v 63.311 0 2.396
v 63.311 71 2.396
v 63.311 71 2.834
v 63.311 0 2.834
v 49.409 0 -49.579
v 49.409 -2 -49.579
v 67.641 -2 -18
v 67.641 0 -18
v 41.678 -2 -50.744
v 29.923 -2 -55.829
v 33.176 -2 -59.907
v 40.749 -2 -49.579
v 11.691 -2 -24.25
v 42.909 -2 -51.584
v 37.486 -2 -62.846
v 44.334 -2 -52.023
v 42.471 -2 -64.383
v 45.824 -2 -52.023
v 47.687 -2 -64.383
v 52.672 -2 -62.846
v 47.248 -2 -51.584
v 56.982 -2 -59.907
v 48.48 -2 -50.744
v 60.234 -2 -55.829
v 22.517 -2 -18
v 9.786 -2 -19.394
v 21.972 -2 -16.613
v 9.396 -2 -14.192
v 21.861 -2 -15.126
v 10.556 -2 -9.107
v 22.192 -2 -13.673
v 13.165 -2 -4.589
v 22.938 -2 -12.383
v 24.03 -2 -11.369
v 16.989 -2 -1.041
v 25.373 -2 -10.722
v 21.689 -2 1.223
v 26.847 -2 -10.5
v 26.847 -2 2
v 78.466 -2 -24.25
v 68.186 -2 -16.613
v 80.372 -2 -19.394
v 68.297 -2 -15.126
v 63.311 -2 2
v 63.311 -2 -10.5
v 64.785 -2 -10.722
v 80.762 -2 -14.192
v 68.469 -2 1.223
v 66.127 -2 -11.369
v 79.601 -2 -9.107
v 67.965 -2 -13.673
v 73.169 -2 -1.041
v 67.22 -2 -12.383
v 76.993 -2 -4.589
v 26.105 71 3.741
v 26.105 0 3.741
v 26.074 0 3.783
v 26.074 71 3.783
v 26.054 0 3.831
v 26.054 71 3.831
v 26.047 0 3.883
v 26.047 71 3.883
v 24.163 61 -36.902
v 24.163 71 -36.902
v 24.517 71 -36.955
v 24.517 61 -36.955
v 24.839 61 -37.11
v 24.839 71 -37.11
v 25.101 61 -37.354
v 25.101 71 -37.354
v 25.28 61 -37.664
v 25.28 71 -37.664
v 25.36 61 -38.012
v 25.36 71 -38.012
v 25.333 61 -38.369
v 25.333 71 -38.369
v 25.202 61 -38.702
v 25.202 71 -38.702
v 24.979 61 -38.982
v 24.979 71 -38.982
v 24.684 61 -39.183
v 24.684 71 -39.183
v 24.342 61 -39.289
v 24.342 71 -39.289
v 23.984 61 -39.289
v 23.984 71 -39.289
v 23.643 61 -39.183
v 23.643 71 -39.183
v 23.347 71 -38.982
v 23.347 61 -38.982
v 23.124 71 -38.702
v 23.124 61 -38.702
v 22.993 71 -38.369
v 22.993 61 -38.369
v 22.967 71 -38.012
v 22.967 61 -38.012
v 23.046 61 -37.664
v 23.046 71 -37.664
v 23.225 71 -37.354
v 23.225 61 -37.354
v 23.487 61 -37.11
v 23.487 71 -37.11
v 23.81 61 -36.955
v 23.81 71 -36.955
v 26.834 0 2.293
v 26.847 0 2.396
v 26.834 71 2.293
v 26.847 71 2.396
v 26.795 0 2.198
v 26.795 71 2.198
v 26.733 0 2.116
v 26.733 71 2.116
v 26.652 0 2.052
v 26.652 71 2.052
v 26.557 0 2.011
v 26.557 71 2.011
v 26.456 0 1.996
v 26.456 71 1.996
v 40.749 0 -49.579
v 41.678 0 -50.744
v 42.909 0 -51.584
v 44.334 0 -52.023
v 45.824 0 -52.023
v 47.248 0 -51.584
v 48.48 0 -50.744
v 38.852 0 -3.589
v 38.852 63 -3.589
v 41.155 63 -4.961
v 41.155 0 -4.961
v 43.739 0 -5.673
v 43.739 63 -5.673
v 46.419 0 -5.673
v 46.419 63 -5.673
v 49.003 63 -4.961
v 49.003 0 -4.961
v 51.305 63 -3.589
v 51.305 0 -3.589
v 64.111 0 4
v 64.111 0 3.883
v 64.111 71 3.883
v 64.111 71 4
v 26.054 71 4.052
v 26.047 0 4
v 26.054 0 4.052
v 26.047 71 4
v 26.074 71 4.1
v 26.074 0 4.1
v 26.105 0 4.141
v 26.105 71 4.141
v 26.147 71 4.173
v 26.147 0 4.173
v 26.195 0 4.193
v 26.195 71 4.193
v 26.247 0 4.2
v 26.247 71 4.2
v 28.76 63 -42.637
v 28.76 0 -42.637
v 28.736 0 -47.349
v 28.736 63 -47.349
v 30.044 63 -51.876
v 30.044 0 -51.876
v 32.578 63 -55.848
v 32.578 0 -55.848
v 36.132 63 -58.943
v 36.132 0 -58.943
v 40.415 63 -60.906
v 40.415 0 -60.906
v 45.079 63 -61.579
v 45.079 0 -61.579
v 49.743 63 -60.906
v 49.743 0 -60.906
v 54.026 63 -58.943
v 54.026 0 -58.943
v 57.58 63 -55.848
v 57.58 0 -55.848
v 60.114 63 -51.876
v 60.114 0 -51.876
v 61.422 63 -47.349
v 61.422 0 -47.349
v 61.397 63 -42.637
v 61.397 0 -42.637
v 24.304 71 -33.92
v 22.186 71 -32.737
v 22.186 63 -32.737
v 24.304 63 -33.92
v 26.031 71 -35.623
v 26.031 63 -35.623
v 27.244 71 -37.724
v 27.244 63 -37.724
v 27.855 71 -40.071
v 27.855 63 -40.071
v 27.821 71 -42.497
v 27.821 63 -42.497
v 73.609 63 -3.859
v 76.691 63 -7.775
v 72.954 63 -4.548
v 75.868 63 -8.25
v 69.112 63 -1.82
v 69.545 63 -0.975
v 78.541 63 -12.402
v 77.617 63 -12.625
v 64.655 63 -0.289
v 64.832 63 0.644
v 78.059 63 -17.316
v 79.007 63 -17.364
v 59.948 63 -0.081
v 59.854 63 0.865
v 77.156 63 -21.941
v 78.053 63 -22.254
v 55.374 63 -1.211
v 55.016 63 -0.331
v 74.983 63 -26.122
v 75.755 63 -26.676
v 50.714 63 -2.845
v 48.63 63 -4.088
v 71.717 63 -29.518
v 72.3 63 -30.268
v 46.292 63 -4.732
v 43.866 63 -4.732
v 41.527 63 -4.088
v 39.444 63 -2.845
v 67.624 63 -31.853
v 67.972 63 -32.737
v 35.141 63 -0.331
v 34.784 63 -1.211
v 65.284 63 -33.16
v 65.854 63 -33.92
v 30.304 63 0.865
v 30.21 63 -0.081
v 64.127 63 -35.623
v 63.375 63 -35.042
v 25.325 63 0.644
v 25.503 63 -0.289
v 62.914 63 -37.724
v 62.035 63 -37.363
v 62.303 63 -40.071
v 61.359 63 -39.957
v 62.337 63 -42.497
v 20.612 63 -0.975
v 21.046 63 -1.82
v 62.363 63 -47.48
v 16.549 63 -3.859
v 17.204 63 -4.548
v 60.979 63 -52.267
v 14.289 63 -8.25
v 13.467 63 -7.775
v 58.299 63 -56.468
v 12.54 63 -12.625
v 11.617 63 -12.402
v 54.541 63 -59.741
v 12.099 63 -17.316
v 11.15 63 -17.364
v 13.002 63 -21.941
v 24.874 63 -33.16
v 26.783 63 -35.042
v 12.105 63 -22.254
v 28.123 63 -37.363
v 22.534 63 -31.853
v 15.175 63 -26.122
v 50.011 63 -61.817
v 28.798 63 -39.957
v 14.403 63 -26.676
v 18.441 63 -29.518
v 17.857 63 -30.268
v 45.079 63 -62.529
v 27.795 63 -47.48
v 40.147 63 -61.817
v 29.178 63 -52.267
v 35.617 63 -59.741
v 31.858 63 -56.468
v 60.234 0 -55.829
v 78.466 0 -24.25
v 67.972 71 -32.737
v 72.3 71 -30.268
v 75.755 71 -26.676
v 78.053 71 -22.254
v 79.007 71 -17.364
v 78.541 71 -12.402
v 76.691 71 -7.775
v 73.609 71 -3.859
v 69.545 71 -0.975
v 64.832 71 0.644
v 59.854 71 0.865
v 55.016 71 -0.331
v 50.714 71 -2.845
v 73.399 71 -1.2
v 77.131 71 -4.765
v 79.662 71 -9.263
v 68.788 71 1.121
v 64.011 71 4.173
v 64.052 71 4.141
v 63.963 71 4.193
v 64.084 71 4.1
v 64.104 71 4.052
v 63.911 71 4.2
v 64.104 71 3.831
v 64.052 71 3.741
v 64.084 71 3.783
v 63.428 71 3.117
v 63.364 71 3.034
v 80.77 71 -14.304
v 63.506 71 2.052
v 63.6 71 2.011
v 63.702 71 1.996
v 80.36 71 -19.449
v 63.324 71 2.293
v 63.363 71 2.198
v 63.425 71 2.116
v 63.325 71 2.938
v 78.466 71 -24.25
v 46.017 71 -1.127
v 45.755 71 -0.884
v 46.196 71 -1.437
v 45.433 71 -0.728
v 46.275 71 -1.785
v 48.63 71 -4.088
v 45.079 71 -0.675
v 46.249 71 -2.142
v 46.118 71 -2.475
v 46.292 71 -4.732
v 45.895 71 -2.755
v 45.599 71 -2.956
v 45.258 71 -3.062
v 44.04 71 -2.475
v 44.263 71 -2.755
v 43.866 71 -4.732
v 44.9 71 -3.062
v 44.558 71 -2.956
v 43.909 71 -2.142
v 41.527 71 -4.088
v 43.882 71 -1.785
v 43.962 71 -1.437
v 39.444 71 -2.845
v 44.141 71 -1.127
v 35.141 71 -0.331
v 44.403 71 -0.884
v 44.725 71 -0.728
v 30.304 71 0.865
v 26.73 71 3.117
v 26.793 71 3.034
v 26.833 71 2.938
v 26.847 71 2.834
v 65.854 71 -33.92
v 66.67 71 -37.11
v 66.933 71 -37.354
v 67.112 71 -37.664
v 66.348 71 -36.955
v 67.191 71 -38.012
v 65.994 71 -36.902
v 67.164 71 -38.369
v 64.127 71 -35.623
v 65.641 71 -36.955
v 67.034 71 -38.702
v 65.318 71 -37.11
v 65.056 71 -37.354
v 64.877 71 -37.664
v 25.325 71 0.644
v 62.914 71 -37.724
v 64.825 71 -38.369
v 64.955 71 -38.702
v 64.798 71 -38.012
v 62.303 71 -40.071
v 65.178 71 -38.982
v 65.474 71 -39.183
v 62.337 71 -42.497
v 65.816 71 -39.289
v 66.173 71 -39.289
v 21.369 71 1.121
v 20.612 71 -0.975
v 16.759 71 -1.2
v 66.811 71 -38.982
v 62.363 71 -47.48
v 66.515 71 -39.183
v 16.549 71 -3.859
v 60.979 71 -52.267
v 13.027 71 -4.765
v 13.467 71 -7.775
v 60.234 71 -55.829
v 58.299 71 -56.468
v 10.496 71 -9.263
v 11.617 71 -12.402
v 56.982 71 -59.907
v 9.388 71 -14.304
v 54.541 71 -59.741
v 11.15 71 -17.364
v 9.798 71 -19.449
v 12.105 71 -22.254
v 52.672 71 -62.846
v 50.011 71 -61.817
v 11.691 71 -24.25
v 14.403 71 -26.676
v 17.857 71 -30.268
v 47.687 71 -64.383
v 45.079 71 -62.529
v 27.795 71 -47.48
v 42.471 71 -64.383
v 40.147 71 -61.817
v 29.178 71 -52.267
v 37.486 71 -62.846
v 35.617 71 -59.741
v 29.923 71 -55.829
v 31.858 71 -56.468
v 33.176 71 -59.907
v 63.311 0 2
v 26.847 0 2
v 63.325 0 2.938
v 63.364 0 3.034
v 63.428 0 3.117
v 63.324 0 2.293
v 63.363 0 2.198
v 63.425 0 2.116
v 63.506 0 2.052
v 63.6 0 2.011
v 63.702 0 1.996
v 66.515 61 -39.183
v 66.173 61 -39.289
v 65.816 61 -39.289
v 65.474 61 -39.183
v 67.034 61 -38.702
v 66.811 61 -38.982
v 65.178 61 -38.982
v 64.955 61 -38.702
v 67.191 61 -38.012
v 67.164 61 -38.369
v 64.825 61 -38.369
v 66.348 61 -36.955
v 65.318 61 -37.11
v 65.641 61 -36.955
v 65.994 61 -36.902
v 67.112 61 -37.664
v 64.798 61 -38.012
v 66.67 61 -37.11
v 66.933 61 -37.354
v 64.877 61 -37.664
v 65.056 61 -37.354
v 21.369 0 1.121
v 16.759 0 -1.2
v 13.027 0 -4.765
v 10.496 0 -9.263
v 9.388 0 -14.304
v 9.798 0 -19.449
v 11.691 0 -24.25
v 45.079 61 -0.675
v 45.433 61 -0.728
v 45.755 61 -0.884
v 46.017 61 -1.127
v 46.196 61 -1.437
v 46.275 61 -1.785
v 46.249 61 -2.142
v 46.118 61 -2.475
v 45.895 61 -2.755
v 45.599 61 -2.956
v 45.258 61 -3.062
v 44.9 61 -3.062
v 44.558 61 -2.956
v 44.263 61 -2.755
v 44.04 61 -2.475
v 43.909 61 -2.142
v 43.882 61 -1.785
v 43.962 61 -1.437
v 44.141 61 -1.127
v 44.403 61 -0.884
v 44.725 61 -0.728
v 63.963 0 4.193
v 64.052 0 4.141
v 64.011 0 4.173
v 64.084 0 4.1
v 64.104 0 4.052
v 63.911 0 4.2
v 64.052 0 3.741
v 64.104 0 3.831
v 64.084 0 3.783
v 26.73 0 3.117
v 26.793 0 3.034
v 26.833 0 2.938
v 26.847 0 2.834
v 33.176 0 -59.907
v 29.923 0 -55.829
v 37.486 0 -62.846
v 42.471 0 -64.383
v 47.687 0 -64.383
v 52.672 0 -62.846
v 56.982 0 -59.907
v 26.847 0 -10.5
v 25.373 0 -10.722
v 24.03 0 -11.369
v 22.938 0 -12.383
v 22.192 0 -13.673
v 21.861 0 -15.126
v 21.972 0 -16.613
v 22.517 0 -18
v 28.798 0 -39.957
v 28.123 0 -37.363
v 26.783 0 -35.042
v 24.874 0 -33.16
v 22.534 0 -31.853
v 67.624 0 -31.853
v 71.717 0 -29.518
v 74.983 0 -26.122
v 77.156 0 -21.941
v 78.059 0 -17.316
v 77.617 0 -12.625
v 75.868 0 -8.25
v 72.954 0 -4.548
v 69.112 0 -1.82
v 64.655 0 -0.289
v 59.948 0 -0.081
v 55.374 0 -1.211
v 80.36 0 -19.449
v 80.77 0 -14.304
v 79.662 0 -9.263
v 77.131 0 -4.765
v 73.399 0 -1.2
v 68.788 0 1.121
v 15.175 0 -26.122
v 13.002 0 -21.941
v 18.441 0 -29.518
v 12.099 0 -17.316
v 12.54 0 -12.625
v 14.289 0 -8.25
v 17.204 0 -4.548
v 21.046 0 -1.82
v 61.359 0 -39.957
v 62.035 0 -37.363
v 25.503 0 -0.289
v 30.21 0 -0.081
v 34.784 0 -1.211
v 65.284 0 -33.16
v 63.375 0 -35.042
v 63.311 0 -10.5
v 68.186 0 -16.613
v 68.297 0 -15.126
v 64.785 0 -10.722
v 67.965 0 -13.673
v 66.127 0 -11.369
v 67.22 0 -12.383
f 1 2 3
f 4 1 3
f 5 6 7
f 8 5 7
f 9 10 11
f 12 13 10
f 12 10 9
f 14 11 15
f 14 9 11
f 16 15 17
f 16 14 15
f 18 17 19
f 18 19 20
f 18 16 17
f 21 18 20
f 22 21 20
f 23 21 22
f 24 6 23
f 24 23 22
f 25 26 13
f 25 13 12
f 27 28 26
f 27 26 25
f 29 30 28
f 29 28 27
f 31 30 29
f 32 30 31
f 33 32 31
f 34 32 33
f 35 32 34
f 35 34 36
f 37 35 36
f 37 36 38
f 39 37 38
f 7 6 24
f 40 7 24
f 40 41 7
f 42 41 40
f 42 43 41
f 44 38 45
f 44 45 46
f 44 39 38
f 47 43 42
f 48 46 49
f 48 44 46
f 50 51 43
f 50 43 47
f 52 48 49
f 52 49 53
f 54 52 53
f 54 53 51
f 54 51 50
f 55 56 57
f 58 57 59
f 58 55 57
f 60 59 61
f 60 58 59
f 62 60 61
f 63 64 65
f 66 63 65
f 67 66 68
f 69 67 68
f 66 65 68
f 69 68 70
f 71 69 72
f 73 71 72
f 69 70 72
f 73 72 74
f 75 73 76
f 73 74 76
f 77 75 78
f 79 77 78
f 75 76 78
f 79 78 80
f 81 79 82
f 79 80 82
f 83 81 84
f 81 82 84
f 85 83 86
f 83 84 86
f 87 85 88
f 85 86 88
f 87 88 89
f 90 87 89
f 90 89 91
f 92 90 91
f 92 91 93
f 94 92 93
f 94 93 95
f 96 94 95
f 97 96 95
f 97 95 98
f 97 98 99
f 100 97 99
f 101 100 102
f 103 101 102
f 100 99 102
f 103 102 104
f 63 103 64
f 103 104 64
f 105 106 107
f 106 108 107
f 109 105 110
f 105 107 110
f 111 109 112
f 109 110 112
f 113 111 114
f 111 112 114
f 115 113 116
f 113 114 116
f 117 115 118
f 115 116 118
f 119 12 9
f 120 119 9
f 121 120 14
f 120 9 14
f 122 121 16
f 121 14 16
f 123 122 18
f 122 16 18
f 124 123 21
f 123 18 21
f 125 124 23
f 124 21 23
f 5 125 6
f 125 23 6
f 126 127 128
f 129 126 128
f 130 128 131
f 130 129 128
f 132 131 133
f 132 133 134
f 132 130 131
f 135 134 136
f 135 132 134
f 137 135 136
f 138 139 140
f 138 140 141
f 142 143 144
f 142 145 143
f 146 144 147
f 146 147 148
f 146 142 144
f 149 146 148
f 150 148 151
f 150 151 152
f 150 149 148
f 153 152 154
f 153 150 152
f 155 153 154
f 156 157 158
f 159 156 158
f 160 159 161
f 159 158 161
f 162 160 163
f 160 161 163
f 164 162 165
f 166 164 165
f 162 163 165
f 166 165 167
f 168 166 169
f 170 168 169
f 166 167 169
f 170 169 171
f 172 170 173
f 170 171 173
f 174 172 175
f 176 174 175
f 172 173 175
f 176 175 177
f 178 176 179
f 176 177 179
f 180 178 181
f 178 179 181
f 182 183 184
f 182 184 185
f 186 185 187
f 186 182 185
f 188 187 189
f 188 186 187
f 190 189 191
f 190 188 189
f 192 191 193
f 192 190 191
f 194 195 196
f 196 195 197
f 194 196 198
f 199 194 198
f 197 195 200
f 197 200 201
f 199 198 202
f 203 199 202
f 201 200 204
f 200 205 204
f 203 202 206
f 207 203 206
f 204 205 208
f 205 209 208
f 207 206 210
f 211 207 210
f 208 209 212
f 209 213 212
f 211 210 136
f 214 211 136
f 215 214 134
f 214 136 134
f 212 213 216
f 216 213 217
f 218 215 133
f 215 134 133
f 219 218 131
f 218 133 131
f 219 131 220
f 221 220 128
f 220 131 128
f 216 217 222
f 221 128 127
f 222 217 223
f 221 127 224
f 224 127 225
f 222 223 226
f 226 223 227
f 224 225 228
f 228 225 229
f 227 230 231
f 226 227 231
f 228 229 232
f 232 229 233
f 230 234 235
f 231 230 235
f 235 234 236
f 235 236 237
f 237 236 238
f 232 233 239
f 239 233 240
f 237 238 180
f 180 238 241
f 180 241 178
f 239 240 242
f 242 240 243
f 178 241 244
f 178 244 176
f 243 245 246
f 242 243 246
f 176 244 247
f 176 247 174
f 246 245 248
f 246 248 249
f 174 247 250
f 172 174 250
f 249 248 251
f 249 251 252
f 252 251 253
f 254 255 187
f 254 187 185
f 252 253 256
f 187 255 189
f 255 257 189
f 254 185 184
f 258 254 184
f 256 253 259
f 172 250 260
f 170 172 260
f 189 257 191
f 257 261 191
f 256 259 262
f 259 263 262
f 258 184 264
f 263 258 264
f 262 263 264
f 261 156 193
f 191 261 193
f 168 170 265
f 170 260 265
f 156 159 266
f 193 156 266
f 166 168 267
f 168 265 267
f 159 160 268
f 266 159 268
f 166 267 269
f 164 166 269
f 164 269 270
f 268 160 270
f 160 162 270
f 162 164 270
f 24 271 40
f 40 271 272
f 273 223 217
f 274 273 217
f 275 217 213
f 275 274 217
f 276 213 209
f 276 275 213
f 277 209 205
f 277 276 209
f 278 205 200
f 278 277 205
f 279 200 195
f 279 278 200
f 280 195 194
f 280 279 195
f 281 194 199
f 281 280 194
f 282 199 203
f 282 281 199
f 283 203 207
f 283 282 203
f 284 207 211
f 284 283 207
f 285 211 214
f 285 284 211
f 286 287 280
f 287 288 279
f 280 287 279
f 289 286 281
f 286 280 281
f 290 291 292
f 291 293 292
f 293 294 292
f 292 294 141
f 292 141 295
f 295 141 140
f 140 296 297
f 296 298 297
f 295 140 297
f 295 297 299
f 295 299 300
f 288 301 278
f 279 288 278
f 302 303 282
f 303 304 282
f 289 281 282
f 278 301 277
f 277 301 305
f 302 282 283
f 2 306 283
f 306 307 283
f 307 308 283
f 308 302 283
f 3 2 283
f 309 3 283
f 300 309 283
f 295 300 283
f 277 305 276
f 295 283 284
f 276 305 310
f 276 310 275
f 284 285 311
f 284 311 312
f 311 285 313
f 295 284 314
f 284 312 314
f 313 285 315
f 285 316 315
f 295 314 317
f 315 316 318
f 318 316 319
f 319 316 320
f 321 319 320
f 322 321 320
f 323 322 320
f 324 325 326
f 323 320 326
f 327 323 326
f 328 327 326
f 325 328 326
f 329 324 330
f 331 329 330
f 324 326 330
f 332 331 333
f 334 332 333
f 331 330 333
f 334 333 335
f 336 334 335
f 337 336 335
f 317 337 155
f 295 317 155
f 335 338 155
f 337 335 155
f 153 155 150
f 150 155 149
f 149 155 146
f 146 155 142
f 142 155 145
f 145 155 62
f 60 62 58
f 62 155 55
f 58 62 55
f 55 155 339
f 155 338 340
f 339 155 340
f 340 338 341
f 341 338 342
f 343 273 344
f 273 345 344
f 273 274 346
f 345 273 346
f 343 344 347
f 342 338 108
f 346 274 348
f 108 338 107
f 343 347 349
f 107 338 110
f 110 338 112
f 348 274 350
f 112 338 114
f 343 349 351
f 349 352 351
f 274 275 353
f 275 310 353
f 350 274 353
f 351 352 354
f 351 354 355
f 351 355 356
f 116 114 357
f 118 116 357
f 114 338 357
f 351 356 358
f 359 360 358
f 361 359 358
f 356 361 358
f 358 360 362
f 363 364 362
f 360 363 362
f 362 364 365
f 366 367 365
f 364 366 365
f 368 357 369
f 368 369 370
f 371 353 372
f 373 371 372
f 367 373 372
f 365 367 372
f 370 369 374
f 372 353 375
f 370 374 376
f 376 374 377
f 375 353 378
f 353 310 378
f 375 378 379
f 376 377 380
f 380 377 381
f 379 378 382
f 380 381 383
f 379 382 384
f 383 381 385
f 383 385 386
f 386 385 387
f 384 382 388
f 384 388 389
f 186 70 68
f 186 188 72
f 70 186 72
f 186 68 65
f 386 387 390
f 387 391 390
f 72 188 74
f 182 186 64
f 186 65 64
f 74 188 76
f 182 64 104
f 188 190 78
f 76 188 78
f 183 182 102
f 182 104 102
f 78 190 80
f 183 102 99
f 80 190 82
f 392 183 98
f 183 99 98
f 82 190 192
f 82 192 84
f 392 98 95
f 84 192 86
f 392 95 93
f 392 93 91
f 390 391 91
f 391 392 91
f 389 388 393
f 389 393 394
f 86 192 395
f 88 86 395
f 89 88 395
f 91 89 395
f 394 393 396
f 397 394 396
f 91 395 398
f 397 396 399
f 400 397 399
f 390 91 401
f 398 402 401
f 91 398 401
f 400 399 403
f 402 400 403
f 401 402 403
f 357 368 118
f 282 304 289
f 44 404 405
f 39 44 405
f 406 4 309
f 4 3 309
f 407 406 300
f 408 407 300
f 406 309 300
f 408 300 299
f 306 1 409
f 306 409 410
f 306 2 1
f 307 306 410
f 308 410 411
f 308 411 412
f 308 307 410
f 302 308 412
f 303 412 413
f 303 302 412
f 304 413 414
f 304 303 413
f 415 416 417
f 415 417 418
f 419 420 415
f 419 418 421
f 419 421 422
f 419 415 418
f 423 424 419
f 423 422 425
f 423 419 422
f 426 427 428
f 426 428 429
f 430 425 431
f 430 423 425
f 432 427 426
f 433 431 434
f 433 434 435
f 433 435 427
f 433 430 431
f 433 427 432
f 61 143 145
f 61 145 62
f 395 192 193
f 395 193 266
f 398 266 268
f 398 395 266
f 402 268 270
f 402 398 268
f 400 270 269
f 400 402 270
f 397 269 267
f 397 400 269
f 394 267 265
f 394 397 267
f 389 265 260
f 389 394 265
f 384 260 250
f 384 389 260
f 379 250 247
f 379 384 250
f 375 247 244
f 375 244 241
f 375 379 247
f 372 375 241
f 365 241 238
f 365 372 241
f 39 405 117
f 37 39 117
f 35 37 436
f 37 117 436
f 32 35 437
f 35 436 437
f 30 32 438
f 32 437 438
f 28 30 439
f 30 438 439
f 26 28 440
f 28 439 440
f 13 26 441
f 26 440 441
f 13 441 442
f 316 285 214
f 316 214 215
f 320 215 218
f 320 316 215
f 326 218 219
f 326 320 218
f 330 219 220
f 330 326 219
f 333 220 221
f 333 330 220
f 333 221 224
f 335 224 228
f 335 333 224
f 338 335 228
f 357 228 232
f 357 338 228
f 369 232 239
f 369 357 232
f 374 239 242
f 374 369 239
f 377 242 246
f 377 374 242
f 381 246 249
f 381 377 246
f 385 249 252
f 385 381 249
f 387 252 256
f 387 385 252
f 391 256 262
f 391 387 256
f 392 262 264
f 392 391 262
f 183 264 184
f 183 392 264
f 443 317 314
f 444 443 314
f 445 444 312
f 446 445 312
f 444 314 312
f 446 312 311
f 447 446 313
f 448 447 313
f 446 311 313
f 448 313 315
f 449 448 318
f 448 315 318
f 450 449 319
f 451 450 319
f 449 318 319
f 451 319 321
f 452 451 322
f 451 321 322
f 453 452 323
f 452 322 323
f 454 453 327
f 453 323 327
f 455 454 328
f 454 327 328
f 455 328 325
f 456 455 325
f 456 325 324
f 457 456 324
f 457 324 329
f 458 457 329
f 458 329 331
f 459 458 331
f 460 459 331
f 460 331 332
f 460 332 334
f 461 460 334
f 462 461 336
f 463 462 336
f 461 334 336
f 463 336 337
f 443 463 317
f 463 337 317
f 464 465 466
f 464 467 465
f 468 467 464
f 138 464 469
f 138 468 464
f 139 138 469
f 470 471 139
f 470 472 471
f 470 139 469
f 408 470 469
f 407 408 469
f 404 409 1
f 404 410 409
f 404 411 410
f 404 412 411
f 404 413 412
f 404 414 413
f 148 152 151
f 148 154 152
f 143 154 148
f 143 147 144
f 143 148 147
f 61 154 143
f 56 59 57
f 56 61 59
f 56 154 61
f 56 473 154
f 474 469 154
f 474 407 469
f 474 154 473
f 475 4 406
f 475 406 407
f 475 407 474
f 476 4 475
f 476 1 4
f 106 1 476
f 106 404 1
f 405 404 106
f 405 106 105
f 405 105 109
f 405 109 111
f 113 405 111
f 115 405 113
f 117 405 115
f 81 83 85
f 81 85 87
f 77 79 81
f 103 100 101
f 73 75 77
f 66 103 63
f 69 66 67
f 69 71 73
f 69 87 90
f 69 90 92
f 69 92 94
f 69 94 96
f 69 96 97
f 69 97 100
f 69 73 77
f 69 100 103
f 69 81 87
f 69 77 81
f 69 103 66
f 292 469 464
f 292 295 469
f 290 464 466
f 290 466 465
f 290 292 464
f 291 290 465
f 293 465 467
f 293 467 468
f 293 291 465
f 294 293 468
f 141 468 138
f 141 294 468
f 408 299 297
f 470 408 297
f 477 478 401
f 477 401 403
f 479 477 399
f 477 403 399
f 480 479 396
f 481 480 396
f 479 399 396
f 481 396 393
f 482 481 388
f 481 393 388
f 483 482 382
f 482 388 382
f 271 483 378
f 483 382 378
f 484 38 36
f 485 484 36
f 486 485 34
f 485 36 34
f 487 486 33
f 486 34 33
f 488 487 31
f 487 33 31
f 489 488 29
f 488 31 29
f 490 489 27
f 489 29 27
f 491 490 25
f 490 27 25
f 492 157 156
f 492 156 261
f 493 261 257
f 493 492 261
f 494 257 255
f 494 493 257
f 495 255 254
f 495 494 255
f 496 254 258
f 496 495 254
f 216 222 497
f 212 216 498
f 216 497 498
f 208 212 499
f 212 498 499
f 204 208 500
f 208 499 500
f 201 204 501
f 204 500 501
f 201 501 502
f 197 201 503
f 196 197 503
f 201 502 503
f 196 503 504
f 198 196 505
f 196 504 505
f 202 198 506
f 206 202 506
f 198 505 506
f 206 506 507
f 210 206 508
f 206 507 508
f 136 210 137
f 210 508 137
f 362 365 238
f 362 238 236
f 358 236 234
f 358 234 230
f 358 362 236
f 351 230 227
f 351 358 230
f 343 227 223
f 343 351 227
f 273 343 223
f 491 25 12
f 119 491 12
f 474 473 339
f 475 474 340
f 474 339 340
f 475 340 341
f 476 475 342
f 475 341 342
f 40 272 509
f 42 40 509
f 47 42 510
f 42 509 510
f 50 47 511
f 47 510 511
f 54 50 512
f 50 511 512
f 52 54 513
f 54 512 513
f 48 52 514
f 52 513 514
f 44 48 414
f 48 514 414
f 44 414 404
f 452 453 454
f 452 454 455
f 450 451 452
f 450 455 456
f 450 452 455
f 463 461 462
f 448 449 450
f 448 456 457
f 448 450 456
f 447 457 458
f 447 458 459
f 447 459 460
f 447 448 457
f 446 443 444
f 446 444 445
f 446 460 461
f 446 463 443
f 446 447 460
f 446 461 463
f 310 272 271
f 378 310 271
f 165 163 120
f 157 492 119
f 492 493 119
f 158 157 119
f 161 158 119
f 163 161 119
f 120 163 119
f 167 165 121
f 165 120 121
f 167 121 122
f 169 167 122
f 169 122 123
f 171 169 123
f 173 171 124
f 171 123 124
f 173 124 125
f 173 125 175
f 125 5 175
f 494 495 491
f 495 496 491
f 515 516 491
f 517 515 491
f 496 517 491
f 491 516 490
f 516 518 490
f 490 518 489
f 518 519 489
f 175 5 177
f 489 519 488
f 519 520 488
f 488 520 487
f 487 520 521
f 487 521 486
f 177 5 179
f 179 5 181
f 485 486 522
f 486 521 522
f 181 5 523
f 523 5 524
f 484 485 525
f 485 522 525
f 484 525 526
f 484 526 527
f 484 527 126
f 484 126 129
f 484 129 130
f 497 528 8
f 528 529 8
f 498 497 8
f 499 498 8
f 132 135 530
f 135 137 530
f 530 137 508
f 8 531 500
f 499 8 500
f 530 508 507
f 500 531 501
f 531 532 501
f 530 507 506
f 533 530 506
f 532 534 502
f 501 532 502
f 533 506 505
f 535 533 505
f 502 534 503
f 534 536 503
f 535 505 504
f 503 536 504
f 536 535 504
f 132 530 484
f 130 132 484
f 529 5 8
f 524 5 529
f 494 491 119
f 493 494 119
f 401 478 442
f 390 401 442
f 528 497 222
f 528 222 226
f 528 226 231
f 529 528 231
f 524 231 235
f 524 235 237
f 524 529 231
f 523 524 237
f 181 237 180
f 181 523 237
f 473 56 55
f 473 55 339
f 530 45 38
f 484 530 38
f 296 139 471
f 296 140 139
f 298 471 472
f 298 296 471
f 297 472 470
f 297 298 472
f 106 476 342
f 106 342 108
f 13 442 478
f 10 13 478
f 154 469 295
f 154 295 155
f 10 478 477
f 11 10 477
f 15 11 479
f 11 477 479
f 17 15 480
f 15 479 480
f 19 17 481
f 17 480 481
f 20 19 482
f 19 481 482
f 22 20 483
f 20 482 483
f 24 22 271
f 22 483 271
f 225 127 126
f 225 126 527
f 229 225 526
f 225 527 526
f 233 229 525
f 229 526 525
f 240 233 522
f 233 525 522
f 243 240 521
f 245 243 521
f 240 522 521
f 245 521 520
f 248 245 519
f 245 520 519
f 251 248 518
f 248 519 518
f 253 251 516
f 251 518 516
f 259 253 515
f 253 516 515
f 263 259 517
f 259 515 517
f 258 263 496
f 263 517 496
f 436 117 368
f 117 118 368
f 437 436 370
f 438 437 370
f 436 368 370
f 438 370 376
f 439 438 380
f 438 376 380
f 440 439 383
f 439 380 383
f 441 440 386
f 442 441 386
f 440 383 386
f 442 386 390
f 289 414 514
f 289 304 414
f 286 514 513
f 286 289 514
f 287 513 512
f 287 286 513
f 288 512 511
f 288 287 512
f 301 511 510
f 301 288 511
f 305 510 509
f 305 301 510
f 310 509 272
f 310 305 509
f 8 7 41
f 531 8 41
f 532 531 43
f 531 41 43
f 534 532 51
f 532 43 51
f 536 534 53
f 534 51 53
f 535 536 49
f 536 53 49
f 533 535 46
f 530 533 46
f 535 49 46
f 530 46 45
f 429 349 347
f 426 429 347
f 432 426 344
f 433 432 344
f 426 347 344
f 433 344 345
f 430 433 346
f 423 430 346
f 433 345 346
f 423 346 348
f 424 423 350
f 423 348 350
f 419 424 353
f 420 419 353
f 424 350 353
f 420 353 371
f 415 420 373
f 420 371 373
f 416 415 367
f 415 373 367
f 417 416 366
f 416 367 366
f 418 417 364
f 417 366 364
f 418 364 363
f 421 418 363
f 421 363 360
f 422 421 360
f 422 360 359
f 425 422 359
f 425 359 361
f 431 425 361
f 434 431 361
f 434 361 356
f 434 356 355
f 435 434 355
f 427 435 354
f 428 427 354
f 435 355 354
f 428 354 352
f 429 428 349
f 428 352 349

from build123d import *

# Parameters (mm, degrees)
BOSS_EXTRUDE1_DEPTH   = 71
BOSS_EXTRUDE1_2_DEPTH = 71
CUT_EXTRUDE1_START    = -71
CUT_EXTRUDE1_DEPTH    = 71
FILLET1_DEPTH         = 71
FILLET2_R             = 17.5
BOSS_EXTRUDE2_DEPTH   = 2
CUT_EXTRUDE2_REACH    = 128.609
SKETCH5_R             = 1.2
CUT_EXTRUDE3_DEPTH    = 10
CUT_EXTRUDE4_DEPTH    = 8
BOSS_EXTRUDE3_DEPTH   = 71
FILLET3_R             = 0.4
FILLET4_R             = 0.2


with BuildPart() as part:
    # Sketch1 → Boss-Extrude1 (new body)
    with BuildSketch(Plane(origin=(0, 0, 0), x_dir=(1, 0, 0), z_dir=(0, 1, 0))):
        Polygon((-3.464101615, -2), (93.621778265, -2), (45.078838325, 82.078838325), align=None)
        with BuildLine():
            ThreePointArc((53.328838206, 30.789419094), (75.868257522, 8.250000059), (45.078838325, 16.5))
            ThreePointArc((45.078838325, 16.5), (14.289419055, 8.250000187), (36.828838698, 30.789418947))
            ThreePointArc((36.828838698, 30.789418947), (45.078838178, 61.578838325), (53.328838206, 30.789419094))
        make_face(mode=Mode.SUBTRACT)
    extrude(amount=BOSS_EXTRUDE1_DEPTH)

    # Fillet1: read off the stored shape, not the designer's step
    # Fillet1 outline → Fillet1 (cut)
    with BuildSketch(Plane(origin=(0, 0, 0), x_dir=(1, 0, 0), z_dir=(0, 1, 0))):
        with BuildLine():
            ThreePointArc((53.328838325, 30.789419162), (60.354714381, 32.954528877), (67.623619549, 31.852870088))
            ThreePointArc((67.623619549, 31.852870088), (62.626869283, 36.157639839), (61.397204455, 42.637337381))
            ThreePointArc((61.397204455, 42.637337381), (58.716816368, 35.791451453), (53.328838325, 30.789419162))
        make_face()
        with BuildLine():
            ThreePointArc((38.852423231, 3.588630855), (45.078838325, 5.763558647), (51.305253419, 3.588630855))
            ThreePointArc((51.305253419, 3.588630855), (46.716736338, 9.332857994), (45.078838325, 16.5))
            ThreePointArc((45.078838325, 16.5), (43.440940312, 9.332857994), (38.852423231, 3.588630855))
        make_face()
        with BuildLine():
            ThreePointArc((36.828838325, 30.789419162), (31.440860282, 35.791451453), (28.760472195, 42.637337381))
            ThreePointArc((28.760472195, 42.637337381), (27.530807367, 36.157639839), (22.534057101, 31.852870089))
            ThreePointArc((22.534057101, 31.852870089), (29.802962269, 32.954528877), (36.828838325, 30.789419162))
        make_face()
    extrude(amount=FILLET1_DEPTH, mode=Mode.SUBTRACT)

    # Fillet2
    fillet2_edges = [part.edges().sort_by_distance(p)[0] for p in [
        (93.621778265, 35.5, 2),
        (-3.464101615, 35.5, 2),
        (45.078838325, 35.5, -82.078838325),
    ]]
    fillet(fillet2_edges, radius=FILLET2_R)

    # Sketch3 → Boss-Extrude2 (add)
    with BuildSketch(Plane.XZ):
        with BuildLine():
            Line((60.234282891, -55.828838325), (78.466333699, -24.25))
            ThreePointArc((78.466333699, -24.25), (78.466333699, -6.75), (63.310889132, 2))
            Line((63.310889132, 2), (26.846787517, 2))
            ThreePointArc((26.846787517, 2), (11.691342951, -6.75), (11.691342951, -24.25))
            Line((11.691342951, -24.25), (29.923393759, -55.828838325))
            ThreePointArc((29.923393759, -55.828838325), (45.078838325, -64.578838325), (60.234282891, -55.828838325))
        make_face()
    extrude(amount=BOSS_EXTRUDE2_DEPTH)

    # Sketch4 → Cut-Extrude2 (cut, up to next)
    with BuildSketch(Plane.XZ.offset(2), mode=Mode.PRIVATE) as cut_extrude2_sk1:
        with BuildLine():
            Line((63.310889132, -10.5), (26.846787517, -10.5))
            ThreePointArc((26.846787517, -10.5), (22.516660498, -13), (22.516660498, -18))
            Line((22.516660498, -18), (40.748711306, -49.578838325))
            ThreePointArc((40.748711306, -49.578838325), (45.078838325, -52.078838325), (49.408965344, -49.578838325))
            Line((49.408965344, -49.578838325), (67.641016151, -18))
            ThreePointArc((67.641016151, -18), (67.641016151, -13), (63.310889132, -10.5))
        make_face()
    cut_extrude2_tool1 = extrude(cut_extrude2_sk1.sketch, amount=-CUT_EXTRUDE2_REACH, mode=Mode.PRIVATE) & part.part
    add(cut_extrude2_tool1.solids().sort_by_distance((45.078838, -2, -26.026279))[0], mode=Mode.SUBTRACT)

    # Sketch5 → Cut-Extrude3 (cut)
    with BuildSketch(Plane(origin=(0, 71, 0), x_dir=(1, 0, 0), z_dir=(0, 1, 0))):
        with Locations(Location((45.078838325, 1.875, 0), (0, 0, 270))):
            Circle(SKETCH5_R)
        with Locations(Location((24.163216795, 38.101919162, 0), (0, 0, 270))):
            Circle(SKETCH5_R)
        with Locations(Location((65.994459855, 38.101919162, 0), (0, 0, 270))):
            Circle(SKETCH5_R)
    extrude(amount=-CUT_EXTRUDE3_DEPTH, mode=Mode.SUBTRACT)

    # Sketch7 → Cut-Extrude4 (cut)
    with BuildSketch(Plane(origin=(0, 71, 0), x_dir=(1, 0, 0), z_dir=(0, 1, 0))):
        with BuildLine():
            ThreePointArc((50.713743985, 2.845248996), (45.078838325, 4.813558647), (39.443932665, 2.845248996))
            ThreePointArc((39.443932665, 2.845248996), (13.466695029, 7.775), (22.186024243, 32.736823215))
            ThreePointArc((22.186024243, 32.736823215), (26.708083233, 36.632639839), (27.820929903, 42.496766114))
            ThreePointArc((27.820929903, 42.496766114), (45.078838325, 62.528838325), (62.336746747, 42.496766114))
            ThreePointArc((62.336746747, 42.496766114), (63.449593417, 36.632639839), (67.971652407, 32.736823215))
            ThreePointArc((67.971652407, 32.736823215), (76.690981621, 7.775), (50.713743985, 2.845248996))
        make_face()
    extrude(amount=-CUT_EXTRUDE4_DEPTH, mode=Mode.SUBTRACT)

    # Sketch8 → Boss-Extrude3 (add, through all)
    with BuildSketch(Plane(origin=(0, 0, 0), x_dir=(1, 0, 0), z_dir=(0, 1, 0))):
        Polygon((63.310889132, -2), (63.310889132, -3), (64.110889132, -3.8), (64.110889132, -4.2), (26.046787517, -4.2), (26.046787517, -3.8), (26.846787517, -3), (26.846787517, -2), align=None)
    extrude(amount=BOSS_EXTRUDE3_DEPTH)

    # Fillet3
    fillet3_edges = [part.edges().sort_by_distance(p)[0] for p in [
        (63.310889132, 35.5, 2),
        (26.846787517, 35.5, 3),
        (63.310889132, 35.5, 3),
        (26.846787517, 35.5, 2),
    ]]
    fillet(fillet3_edges, radius=FILLET3_R)

    # Fillet4
    fillet4_edges = [part.edges().sort_by_distance(p)[0] for p in [
        (26.046787517, 35.5, 3.8),
        (26.046787517, 35.5, 4.2),
        (64.110889132, 35.5, 4.2),
        (64.110889132, 35.5, 3.8),
    ]]
    fillet(fillet4_edges, radius=FILLET4_R)


with BuildPart() as body_2:
    # Sketch1 → Boss-Extrude1 2 (new body)
    with BuildSketch(Plane(origin=(0, 0, 0), x_dir=(1, 0, 0), z_dir=(0, 1, 0))):
        with BuildLine():
            ThreePointArc((36.828838698, 30.789418947), (42.868257595, 24.749999813), (45.078838325, 16.5))
            ThreePointArc((45.078838325, 16.5), (47.289419128, 24.749999941), (53.328838206, 30.789419094))
            ThreePointArc((53.328838206, 30.789419094), (45.078838472, 28.578838325), (36.828838698, 30.789418947))
        make_face()
    extrude(amount=BOSS_EXTRUDE1_2_DEPTH)

    # Sketch2 → Cut-Extrude1 (cut)
    with BuildSketch(Plane(origin=(0, 71, 0), x_dir=(1, 0, 0), z_dir=(0, 1, 0)).offset(CUT_EXTRUDE1_START)):
        with BuildLine():
            ThreePointArc((36.828838325, 30.789419162), (45.078838325, 28.578838325), (53.328838325, 30.789419162))
            ThreePointArc((53.328838325, 30.789419162), (47.289419162, 24.75), (45.078838325, 16.5))
            ThreePointArc((45.078838325, 16.5), (42.868257487, 24.75), (36.828838325, 30.789419162))
        make_face()
    extrude(amount=CUT_EXTRUDE1_DEPTH, mode=Mode.SUBTRACT)


solid = part.part
